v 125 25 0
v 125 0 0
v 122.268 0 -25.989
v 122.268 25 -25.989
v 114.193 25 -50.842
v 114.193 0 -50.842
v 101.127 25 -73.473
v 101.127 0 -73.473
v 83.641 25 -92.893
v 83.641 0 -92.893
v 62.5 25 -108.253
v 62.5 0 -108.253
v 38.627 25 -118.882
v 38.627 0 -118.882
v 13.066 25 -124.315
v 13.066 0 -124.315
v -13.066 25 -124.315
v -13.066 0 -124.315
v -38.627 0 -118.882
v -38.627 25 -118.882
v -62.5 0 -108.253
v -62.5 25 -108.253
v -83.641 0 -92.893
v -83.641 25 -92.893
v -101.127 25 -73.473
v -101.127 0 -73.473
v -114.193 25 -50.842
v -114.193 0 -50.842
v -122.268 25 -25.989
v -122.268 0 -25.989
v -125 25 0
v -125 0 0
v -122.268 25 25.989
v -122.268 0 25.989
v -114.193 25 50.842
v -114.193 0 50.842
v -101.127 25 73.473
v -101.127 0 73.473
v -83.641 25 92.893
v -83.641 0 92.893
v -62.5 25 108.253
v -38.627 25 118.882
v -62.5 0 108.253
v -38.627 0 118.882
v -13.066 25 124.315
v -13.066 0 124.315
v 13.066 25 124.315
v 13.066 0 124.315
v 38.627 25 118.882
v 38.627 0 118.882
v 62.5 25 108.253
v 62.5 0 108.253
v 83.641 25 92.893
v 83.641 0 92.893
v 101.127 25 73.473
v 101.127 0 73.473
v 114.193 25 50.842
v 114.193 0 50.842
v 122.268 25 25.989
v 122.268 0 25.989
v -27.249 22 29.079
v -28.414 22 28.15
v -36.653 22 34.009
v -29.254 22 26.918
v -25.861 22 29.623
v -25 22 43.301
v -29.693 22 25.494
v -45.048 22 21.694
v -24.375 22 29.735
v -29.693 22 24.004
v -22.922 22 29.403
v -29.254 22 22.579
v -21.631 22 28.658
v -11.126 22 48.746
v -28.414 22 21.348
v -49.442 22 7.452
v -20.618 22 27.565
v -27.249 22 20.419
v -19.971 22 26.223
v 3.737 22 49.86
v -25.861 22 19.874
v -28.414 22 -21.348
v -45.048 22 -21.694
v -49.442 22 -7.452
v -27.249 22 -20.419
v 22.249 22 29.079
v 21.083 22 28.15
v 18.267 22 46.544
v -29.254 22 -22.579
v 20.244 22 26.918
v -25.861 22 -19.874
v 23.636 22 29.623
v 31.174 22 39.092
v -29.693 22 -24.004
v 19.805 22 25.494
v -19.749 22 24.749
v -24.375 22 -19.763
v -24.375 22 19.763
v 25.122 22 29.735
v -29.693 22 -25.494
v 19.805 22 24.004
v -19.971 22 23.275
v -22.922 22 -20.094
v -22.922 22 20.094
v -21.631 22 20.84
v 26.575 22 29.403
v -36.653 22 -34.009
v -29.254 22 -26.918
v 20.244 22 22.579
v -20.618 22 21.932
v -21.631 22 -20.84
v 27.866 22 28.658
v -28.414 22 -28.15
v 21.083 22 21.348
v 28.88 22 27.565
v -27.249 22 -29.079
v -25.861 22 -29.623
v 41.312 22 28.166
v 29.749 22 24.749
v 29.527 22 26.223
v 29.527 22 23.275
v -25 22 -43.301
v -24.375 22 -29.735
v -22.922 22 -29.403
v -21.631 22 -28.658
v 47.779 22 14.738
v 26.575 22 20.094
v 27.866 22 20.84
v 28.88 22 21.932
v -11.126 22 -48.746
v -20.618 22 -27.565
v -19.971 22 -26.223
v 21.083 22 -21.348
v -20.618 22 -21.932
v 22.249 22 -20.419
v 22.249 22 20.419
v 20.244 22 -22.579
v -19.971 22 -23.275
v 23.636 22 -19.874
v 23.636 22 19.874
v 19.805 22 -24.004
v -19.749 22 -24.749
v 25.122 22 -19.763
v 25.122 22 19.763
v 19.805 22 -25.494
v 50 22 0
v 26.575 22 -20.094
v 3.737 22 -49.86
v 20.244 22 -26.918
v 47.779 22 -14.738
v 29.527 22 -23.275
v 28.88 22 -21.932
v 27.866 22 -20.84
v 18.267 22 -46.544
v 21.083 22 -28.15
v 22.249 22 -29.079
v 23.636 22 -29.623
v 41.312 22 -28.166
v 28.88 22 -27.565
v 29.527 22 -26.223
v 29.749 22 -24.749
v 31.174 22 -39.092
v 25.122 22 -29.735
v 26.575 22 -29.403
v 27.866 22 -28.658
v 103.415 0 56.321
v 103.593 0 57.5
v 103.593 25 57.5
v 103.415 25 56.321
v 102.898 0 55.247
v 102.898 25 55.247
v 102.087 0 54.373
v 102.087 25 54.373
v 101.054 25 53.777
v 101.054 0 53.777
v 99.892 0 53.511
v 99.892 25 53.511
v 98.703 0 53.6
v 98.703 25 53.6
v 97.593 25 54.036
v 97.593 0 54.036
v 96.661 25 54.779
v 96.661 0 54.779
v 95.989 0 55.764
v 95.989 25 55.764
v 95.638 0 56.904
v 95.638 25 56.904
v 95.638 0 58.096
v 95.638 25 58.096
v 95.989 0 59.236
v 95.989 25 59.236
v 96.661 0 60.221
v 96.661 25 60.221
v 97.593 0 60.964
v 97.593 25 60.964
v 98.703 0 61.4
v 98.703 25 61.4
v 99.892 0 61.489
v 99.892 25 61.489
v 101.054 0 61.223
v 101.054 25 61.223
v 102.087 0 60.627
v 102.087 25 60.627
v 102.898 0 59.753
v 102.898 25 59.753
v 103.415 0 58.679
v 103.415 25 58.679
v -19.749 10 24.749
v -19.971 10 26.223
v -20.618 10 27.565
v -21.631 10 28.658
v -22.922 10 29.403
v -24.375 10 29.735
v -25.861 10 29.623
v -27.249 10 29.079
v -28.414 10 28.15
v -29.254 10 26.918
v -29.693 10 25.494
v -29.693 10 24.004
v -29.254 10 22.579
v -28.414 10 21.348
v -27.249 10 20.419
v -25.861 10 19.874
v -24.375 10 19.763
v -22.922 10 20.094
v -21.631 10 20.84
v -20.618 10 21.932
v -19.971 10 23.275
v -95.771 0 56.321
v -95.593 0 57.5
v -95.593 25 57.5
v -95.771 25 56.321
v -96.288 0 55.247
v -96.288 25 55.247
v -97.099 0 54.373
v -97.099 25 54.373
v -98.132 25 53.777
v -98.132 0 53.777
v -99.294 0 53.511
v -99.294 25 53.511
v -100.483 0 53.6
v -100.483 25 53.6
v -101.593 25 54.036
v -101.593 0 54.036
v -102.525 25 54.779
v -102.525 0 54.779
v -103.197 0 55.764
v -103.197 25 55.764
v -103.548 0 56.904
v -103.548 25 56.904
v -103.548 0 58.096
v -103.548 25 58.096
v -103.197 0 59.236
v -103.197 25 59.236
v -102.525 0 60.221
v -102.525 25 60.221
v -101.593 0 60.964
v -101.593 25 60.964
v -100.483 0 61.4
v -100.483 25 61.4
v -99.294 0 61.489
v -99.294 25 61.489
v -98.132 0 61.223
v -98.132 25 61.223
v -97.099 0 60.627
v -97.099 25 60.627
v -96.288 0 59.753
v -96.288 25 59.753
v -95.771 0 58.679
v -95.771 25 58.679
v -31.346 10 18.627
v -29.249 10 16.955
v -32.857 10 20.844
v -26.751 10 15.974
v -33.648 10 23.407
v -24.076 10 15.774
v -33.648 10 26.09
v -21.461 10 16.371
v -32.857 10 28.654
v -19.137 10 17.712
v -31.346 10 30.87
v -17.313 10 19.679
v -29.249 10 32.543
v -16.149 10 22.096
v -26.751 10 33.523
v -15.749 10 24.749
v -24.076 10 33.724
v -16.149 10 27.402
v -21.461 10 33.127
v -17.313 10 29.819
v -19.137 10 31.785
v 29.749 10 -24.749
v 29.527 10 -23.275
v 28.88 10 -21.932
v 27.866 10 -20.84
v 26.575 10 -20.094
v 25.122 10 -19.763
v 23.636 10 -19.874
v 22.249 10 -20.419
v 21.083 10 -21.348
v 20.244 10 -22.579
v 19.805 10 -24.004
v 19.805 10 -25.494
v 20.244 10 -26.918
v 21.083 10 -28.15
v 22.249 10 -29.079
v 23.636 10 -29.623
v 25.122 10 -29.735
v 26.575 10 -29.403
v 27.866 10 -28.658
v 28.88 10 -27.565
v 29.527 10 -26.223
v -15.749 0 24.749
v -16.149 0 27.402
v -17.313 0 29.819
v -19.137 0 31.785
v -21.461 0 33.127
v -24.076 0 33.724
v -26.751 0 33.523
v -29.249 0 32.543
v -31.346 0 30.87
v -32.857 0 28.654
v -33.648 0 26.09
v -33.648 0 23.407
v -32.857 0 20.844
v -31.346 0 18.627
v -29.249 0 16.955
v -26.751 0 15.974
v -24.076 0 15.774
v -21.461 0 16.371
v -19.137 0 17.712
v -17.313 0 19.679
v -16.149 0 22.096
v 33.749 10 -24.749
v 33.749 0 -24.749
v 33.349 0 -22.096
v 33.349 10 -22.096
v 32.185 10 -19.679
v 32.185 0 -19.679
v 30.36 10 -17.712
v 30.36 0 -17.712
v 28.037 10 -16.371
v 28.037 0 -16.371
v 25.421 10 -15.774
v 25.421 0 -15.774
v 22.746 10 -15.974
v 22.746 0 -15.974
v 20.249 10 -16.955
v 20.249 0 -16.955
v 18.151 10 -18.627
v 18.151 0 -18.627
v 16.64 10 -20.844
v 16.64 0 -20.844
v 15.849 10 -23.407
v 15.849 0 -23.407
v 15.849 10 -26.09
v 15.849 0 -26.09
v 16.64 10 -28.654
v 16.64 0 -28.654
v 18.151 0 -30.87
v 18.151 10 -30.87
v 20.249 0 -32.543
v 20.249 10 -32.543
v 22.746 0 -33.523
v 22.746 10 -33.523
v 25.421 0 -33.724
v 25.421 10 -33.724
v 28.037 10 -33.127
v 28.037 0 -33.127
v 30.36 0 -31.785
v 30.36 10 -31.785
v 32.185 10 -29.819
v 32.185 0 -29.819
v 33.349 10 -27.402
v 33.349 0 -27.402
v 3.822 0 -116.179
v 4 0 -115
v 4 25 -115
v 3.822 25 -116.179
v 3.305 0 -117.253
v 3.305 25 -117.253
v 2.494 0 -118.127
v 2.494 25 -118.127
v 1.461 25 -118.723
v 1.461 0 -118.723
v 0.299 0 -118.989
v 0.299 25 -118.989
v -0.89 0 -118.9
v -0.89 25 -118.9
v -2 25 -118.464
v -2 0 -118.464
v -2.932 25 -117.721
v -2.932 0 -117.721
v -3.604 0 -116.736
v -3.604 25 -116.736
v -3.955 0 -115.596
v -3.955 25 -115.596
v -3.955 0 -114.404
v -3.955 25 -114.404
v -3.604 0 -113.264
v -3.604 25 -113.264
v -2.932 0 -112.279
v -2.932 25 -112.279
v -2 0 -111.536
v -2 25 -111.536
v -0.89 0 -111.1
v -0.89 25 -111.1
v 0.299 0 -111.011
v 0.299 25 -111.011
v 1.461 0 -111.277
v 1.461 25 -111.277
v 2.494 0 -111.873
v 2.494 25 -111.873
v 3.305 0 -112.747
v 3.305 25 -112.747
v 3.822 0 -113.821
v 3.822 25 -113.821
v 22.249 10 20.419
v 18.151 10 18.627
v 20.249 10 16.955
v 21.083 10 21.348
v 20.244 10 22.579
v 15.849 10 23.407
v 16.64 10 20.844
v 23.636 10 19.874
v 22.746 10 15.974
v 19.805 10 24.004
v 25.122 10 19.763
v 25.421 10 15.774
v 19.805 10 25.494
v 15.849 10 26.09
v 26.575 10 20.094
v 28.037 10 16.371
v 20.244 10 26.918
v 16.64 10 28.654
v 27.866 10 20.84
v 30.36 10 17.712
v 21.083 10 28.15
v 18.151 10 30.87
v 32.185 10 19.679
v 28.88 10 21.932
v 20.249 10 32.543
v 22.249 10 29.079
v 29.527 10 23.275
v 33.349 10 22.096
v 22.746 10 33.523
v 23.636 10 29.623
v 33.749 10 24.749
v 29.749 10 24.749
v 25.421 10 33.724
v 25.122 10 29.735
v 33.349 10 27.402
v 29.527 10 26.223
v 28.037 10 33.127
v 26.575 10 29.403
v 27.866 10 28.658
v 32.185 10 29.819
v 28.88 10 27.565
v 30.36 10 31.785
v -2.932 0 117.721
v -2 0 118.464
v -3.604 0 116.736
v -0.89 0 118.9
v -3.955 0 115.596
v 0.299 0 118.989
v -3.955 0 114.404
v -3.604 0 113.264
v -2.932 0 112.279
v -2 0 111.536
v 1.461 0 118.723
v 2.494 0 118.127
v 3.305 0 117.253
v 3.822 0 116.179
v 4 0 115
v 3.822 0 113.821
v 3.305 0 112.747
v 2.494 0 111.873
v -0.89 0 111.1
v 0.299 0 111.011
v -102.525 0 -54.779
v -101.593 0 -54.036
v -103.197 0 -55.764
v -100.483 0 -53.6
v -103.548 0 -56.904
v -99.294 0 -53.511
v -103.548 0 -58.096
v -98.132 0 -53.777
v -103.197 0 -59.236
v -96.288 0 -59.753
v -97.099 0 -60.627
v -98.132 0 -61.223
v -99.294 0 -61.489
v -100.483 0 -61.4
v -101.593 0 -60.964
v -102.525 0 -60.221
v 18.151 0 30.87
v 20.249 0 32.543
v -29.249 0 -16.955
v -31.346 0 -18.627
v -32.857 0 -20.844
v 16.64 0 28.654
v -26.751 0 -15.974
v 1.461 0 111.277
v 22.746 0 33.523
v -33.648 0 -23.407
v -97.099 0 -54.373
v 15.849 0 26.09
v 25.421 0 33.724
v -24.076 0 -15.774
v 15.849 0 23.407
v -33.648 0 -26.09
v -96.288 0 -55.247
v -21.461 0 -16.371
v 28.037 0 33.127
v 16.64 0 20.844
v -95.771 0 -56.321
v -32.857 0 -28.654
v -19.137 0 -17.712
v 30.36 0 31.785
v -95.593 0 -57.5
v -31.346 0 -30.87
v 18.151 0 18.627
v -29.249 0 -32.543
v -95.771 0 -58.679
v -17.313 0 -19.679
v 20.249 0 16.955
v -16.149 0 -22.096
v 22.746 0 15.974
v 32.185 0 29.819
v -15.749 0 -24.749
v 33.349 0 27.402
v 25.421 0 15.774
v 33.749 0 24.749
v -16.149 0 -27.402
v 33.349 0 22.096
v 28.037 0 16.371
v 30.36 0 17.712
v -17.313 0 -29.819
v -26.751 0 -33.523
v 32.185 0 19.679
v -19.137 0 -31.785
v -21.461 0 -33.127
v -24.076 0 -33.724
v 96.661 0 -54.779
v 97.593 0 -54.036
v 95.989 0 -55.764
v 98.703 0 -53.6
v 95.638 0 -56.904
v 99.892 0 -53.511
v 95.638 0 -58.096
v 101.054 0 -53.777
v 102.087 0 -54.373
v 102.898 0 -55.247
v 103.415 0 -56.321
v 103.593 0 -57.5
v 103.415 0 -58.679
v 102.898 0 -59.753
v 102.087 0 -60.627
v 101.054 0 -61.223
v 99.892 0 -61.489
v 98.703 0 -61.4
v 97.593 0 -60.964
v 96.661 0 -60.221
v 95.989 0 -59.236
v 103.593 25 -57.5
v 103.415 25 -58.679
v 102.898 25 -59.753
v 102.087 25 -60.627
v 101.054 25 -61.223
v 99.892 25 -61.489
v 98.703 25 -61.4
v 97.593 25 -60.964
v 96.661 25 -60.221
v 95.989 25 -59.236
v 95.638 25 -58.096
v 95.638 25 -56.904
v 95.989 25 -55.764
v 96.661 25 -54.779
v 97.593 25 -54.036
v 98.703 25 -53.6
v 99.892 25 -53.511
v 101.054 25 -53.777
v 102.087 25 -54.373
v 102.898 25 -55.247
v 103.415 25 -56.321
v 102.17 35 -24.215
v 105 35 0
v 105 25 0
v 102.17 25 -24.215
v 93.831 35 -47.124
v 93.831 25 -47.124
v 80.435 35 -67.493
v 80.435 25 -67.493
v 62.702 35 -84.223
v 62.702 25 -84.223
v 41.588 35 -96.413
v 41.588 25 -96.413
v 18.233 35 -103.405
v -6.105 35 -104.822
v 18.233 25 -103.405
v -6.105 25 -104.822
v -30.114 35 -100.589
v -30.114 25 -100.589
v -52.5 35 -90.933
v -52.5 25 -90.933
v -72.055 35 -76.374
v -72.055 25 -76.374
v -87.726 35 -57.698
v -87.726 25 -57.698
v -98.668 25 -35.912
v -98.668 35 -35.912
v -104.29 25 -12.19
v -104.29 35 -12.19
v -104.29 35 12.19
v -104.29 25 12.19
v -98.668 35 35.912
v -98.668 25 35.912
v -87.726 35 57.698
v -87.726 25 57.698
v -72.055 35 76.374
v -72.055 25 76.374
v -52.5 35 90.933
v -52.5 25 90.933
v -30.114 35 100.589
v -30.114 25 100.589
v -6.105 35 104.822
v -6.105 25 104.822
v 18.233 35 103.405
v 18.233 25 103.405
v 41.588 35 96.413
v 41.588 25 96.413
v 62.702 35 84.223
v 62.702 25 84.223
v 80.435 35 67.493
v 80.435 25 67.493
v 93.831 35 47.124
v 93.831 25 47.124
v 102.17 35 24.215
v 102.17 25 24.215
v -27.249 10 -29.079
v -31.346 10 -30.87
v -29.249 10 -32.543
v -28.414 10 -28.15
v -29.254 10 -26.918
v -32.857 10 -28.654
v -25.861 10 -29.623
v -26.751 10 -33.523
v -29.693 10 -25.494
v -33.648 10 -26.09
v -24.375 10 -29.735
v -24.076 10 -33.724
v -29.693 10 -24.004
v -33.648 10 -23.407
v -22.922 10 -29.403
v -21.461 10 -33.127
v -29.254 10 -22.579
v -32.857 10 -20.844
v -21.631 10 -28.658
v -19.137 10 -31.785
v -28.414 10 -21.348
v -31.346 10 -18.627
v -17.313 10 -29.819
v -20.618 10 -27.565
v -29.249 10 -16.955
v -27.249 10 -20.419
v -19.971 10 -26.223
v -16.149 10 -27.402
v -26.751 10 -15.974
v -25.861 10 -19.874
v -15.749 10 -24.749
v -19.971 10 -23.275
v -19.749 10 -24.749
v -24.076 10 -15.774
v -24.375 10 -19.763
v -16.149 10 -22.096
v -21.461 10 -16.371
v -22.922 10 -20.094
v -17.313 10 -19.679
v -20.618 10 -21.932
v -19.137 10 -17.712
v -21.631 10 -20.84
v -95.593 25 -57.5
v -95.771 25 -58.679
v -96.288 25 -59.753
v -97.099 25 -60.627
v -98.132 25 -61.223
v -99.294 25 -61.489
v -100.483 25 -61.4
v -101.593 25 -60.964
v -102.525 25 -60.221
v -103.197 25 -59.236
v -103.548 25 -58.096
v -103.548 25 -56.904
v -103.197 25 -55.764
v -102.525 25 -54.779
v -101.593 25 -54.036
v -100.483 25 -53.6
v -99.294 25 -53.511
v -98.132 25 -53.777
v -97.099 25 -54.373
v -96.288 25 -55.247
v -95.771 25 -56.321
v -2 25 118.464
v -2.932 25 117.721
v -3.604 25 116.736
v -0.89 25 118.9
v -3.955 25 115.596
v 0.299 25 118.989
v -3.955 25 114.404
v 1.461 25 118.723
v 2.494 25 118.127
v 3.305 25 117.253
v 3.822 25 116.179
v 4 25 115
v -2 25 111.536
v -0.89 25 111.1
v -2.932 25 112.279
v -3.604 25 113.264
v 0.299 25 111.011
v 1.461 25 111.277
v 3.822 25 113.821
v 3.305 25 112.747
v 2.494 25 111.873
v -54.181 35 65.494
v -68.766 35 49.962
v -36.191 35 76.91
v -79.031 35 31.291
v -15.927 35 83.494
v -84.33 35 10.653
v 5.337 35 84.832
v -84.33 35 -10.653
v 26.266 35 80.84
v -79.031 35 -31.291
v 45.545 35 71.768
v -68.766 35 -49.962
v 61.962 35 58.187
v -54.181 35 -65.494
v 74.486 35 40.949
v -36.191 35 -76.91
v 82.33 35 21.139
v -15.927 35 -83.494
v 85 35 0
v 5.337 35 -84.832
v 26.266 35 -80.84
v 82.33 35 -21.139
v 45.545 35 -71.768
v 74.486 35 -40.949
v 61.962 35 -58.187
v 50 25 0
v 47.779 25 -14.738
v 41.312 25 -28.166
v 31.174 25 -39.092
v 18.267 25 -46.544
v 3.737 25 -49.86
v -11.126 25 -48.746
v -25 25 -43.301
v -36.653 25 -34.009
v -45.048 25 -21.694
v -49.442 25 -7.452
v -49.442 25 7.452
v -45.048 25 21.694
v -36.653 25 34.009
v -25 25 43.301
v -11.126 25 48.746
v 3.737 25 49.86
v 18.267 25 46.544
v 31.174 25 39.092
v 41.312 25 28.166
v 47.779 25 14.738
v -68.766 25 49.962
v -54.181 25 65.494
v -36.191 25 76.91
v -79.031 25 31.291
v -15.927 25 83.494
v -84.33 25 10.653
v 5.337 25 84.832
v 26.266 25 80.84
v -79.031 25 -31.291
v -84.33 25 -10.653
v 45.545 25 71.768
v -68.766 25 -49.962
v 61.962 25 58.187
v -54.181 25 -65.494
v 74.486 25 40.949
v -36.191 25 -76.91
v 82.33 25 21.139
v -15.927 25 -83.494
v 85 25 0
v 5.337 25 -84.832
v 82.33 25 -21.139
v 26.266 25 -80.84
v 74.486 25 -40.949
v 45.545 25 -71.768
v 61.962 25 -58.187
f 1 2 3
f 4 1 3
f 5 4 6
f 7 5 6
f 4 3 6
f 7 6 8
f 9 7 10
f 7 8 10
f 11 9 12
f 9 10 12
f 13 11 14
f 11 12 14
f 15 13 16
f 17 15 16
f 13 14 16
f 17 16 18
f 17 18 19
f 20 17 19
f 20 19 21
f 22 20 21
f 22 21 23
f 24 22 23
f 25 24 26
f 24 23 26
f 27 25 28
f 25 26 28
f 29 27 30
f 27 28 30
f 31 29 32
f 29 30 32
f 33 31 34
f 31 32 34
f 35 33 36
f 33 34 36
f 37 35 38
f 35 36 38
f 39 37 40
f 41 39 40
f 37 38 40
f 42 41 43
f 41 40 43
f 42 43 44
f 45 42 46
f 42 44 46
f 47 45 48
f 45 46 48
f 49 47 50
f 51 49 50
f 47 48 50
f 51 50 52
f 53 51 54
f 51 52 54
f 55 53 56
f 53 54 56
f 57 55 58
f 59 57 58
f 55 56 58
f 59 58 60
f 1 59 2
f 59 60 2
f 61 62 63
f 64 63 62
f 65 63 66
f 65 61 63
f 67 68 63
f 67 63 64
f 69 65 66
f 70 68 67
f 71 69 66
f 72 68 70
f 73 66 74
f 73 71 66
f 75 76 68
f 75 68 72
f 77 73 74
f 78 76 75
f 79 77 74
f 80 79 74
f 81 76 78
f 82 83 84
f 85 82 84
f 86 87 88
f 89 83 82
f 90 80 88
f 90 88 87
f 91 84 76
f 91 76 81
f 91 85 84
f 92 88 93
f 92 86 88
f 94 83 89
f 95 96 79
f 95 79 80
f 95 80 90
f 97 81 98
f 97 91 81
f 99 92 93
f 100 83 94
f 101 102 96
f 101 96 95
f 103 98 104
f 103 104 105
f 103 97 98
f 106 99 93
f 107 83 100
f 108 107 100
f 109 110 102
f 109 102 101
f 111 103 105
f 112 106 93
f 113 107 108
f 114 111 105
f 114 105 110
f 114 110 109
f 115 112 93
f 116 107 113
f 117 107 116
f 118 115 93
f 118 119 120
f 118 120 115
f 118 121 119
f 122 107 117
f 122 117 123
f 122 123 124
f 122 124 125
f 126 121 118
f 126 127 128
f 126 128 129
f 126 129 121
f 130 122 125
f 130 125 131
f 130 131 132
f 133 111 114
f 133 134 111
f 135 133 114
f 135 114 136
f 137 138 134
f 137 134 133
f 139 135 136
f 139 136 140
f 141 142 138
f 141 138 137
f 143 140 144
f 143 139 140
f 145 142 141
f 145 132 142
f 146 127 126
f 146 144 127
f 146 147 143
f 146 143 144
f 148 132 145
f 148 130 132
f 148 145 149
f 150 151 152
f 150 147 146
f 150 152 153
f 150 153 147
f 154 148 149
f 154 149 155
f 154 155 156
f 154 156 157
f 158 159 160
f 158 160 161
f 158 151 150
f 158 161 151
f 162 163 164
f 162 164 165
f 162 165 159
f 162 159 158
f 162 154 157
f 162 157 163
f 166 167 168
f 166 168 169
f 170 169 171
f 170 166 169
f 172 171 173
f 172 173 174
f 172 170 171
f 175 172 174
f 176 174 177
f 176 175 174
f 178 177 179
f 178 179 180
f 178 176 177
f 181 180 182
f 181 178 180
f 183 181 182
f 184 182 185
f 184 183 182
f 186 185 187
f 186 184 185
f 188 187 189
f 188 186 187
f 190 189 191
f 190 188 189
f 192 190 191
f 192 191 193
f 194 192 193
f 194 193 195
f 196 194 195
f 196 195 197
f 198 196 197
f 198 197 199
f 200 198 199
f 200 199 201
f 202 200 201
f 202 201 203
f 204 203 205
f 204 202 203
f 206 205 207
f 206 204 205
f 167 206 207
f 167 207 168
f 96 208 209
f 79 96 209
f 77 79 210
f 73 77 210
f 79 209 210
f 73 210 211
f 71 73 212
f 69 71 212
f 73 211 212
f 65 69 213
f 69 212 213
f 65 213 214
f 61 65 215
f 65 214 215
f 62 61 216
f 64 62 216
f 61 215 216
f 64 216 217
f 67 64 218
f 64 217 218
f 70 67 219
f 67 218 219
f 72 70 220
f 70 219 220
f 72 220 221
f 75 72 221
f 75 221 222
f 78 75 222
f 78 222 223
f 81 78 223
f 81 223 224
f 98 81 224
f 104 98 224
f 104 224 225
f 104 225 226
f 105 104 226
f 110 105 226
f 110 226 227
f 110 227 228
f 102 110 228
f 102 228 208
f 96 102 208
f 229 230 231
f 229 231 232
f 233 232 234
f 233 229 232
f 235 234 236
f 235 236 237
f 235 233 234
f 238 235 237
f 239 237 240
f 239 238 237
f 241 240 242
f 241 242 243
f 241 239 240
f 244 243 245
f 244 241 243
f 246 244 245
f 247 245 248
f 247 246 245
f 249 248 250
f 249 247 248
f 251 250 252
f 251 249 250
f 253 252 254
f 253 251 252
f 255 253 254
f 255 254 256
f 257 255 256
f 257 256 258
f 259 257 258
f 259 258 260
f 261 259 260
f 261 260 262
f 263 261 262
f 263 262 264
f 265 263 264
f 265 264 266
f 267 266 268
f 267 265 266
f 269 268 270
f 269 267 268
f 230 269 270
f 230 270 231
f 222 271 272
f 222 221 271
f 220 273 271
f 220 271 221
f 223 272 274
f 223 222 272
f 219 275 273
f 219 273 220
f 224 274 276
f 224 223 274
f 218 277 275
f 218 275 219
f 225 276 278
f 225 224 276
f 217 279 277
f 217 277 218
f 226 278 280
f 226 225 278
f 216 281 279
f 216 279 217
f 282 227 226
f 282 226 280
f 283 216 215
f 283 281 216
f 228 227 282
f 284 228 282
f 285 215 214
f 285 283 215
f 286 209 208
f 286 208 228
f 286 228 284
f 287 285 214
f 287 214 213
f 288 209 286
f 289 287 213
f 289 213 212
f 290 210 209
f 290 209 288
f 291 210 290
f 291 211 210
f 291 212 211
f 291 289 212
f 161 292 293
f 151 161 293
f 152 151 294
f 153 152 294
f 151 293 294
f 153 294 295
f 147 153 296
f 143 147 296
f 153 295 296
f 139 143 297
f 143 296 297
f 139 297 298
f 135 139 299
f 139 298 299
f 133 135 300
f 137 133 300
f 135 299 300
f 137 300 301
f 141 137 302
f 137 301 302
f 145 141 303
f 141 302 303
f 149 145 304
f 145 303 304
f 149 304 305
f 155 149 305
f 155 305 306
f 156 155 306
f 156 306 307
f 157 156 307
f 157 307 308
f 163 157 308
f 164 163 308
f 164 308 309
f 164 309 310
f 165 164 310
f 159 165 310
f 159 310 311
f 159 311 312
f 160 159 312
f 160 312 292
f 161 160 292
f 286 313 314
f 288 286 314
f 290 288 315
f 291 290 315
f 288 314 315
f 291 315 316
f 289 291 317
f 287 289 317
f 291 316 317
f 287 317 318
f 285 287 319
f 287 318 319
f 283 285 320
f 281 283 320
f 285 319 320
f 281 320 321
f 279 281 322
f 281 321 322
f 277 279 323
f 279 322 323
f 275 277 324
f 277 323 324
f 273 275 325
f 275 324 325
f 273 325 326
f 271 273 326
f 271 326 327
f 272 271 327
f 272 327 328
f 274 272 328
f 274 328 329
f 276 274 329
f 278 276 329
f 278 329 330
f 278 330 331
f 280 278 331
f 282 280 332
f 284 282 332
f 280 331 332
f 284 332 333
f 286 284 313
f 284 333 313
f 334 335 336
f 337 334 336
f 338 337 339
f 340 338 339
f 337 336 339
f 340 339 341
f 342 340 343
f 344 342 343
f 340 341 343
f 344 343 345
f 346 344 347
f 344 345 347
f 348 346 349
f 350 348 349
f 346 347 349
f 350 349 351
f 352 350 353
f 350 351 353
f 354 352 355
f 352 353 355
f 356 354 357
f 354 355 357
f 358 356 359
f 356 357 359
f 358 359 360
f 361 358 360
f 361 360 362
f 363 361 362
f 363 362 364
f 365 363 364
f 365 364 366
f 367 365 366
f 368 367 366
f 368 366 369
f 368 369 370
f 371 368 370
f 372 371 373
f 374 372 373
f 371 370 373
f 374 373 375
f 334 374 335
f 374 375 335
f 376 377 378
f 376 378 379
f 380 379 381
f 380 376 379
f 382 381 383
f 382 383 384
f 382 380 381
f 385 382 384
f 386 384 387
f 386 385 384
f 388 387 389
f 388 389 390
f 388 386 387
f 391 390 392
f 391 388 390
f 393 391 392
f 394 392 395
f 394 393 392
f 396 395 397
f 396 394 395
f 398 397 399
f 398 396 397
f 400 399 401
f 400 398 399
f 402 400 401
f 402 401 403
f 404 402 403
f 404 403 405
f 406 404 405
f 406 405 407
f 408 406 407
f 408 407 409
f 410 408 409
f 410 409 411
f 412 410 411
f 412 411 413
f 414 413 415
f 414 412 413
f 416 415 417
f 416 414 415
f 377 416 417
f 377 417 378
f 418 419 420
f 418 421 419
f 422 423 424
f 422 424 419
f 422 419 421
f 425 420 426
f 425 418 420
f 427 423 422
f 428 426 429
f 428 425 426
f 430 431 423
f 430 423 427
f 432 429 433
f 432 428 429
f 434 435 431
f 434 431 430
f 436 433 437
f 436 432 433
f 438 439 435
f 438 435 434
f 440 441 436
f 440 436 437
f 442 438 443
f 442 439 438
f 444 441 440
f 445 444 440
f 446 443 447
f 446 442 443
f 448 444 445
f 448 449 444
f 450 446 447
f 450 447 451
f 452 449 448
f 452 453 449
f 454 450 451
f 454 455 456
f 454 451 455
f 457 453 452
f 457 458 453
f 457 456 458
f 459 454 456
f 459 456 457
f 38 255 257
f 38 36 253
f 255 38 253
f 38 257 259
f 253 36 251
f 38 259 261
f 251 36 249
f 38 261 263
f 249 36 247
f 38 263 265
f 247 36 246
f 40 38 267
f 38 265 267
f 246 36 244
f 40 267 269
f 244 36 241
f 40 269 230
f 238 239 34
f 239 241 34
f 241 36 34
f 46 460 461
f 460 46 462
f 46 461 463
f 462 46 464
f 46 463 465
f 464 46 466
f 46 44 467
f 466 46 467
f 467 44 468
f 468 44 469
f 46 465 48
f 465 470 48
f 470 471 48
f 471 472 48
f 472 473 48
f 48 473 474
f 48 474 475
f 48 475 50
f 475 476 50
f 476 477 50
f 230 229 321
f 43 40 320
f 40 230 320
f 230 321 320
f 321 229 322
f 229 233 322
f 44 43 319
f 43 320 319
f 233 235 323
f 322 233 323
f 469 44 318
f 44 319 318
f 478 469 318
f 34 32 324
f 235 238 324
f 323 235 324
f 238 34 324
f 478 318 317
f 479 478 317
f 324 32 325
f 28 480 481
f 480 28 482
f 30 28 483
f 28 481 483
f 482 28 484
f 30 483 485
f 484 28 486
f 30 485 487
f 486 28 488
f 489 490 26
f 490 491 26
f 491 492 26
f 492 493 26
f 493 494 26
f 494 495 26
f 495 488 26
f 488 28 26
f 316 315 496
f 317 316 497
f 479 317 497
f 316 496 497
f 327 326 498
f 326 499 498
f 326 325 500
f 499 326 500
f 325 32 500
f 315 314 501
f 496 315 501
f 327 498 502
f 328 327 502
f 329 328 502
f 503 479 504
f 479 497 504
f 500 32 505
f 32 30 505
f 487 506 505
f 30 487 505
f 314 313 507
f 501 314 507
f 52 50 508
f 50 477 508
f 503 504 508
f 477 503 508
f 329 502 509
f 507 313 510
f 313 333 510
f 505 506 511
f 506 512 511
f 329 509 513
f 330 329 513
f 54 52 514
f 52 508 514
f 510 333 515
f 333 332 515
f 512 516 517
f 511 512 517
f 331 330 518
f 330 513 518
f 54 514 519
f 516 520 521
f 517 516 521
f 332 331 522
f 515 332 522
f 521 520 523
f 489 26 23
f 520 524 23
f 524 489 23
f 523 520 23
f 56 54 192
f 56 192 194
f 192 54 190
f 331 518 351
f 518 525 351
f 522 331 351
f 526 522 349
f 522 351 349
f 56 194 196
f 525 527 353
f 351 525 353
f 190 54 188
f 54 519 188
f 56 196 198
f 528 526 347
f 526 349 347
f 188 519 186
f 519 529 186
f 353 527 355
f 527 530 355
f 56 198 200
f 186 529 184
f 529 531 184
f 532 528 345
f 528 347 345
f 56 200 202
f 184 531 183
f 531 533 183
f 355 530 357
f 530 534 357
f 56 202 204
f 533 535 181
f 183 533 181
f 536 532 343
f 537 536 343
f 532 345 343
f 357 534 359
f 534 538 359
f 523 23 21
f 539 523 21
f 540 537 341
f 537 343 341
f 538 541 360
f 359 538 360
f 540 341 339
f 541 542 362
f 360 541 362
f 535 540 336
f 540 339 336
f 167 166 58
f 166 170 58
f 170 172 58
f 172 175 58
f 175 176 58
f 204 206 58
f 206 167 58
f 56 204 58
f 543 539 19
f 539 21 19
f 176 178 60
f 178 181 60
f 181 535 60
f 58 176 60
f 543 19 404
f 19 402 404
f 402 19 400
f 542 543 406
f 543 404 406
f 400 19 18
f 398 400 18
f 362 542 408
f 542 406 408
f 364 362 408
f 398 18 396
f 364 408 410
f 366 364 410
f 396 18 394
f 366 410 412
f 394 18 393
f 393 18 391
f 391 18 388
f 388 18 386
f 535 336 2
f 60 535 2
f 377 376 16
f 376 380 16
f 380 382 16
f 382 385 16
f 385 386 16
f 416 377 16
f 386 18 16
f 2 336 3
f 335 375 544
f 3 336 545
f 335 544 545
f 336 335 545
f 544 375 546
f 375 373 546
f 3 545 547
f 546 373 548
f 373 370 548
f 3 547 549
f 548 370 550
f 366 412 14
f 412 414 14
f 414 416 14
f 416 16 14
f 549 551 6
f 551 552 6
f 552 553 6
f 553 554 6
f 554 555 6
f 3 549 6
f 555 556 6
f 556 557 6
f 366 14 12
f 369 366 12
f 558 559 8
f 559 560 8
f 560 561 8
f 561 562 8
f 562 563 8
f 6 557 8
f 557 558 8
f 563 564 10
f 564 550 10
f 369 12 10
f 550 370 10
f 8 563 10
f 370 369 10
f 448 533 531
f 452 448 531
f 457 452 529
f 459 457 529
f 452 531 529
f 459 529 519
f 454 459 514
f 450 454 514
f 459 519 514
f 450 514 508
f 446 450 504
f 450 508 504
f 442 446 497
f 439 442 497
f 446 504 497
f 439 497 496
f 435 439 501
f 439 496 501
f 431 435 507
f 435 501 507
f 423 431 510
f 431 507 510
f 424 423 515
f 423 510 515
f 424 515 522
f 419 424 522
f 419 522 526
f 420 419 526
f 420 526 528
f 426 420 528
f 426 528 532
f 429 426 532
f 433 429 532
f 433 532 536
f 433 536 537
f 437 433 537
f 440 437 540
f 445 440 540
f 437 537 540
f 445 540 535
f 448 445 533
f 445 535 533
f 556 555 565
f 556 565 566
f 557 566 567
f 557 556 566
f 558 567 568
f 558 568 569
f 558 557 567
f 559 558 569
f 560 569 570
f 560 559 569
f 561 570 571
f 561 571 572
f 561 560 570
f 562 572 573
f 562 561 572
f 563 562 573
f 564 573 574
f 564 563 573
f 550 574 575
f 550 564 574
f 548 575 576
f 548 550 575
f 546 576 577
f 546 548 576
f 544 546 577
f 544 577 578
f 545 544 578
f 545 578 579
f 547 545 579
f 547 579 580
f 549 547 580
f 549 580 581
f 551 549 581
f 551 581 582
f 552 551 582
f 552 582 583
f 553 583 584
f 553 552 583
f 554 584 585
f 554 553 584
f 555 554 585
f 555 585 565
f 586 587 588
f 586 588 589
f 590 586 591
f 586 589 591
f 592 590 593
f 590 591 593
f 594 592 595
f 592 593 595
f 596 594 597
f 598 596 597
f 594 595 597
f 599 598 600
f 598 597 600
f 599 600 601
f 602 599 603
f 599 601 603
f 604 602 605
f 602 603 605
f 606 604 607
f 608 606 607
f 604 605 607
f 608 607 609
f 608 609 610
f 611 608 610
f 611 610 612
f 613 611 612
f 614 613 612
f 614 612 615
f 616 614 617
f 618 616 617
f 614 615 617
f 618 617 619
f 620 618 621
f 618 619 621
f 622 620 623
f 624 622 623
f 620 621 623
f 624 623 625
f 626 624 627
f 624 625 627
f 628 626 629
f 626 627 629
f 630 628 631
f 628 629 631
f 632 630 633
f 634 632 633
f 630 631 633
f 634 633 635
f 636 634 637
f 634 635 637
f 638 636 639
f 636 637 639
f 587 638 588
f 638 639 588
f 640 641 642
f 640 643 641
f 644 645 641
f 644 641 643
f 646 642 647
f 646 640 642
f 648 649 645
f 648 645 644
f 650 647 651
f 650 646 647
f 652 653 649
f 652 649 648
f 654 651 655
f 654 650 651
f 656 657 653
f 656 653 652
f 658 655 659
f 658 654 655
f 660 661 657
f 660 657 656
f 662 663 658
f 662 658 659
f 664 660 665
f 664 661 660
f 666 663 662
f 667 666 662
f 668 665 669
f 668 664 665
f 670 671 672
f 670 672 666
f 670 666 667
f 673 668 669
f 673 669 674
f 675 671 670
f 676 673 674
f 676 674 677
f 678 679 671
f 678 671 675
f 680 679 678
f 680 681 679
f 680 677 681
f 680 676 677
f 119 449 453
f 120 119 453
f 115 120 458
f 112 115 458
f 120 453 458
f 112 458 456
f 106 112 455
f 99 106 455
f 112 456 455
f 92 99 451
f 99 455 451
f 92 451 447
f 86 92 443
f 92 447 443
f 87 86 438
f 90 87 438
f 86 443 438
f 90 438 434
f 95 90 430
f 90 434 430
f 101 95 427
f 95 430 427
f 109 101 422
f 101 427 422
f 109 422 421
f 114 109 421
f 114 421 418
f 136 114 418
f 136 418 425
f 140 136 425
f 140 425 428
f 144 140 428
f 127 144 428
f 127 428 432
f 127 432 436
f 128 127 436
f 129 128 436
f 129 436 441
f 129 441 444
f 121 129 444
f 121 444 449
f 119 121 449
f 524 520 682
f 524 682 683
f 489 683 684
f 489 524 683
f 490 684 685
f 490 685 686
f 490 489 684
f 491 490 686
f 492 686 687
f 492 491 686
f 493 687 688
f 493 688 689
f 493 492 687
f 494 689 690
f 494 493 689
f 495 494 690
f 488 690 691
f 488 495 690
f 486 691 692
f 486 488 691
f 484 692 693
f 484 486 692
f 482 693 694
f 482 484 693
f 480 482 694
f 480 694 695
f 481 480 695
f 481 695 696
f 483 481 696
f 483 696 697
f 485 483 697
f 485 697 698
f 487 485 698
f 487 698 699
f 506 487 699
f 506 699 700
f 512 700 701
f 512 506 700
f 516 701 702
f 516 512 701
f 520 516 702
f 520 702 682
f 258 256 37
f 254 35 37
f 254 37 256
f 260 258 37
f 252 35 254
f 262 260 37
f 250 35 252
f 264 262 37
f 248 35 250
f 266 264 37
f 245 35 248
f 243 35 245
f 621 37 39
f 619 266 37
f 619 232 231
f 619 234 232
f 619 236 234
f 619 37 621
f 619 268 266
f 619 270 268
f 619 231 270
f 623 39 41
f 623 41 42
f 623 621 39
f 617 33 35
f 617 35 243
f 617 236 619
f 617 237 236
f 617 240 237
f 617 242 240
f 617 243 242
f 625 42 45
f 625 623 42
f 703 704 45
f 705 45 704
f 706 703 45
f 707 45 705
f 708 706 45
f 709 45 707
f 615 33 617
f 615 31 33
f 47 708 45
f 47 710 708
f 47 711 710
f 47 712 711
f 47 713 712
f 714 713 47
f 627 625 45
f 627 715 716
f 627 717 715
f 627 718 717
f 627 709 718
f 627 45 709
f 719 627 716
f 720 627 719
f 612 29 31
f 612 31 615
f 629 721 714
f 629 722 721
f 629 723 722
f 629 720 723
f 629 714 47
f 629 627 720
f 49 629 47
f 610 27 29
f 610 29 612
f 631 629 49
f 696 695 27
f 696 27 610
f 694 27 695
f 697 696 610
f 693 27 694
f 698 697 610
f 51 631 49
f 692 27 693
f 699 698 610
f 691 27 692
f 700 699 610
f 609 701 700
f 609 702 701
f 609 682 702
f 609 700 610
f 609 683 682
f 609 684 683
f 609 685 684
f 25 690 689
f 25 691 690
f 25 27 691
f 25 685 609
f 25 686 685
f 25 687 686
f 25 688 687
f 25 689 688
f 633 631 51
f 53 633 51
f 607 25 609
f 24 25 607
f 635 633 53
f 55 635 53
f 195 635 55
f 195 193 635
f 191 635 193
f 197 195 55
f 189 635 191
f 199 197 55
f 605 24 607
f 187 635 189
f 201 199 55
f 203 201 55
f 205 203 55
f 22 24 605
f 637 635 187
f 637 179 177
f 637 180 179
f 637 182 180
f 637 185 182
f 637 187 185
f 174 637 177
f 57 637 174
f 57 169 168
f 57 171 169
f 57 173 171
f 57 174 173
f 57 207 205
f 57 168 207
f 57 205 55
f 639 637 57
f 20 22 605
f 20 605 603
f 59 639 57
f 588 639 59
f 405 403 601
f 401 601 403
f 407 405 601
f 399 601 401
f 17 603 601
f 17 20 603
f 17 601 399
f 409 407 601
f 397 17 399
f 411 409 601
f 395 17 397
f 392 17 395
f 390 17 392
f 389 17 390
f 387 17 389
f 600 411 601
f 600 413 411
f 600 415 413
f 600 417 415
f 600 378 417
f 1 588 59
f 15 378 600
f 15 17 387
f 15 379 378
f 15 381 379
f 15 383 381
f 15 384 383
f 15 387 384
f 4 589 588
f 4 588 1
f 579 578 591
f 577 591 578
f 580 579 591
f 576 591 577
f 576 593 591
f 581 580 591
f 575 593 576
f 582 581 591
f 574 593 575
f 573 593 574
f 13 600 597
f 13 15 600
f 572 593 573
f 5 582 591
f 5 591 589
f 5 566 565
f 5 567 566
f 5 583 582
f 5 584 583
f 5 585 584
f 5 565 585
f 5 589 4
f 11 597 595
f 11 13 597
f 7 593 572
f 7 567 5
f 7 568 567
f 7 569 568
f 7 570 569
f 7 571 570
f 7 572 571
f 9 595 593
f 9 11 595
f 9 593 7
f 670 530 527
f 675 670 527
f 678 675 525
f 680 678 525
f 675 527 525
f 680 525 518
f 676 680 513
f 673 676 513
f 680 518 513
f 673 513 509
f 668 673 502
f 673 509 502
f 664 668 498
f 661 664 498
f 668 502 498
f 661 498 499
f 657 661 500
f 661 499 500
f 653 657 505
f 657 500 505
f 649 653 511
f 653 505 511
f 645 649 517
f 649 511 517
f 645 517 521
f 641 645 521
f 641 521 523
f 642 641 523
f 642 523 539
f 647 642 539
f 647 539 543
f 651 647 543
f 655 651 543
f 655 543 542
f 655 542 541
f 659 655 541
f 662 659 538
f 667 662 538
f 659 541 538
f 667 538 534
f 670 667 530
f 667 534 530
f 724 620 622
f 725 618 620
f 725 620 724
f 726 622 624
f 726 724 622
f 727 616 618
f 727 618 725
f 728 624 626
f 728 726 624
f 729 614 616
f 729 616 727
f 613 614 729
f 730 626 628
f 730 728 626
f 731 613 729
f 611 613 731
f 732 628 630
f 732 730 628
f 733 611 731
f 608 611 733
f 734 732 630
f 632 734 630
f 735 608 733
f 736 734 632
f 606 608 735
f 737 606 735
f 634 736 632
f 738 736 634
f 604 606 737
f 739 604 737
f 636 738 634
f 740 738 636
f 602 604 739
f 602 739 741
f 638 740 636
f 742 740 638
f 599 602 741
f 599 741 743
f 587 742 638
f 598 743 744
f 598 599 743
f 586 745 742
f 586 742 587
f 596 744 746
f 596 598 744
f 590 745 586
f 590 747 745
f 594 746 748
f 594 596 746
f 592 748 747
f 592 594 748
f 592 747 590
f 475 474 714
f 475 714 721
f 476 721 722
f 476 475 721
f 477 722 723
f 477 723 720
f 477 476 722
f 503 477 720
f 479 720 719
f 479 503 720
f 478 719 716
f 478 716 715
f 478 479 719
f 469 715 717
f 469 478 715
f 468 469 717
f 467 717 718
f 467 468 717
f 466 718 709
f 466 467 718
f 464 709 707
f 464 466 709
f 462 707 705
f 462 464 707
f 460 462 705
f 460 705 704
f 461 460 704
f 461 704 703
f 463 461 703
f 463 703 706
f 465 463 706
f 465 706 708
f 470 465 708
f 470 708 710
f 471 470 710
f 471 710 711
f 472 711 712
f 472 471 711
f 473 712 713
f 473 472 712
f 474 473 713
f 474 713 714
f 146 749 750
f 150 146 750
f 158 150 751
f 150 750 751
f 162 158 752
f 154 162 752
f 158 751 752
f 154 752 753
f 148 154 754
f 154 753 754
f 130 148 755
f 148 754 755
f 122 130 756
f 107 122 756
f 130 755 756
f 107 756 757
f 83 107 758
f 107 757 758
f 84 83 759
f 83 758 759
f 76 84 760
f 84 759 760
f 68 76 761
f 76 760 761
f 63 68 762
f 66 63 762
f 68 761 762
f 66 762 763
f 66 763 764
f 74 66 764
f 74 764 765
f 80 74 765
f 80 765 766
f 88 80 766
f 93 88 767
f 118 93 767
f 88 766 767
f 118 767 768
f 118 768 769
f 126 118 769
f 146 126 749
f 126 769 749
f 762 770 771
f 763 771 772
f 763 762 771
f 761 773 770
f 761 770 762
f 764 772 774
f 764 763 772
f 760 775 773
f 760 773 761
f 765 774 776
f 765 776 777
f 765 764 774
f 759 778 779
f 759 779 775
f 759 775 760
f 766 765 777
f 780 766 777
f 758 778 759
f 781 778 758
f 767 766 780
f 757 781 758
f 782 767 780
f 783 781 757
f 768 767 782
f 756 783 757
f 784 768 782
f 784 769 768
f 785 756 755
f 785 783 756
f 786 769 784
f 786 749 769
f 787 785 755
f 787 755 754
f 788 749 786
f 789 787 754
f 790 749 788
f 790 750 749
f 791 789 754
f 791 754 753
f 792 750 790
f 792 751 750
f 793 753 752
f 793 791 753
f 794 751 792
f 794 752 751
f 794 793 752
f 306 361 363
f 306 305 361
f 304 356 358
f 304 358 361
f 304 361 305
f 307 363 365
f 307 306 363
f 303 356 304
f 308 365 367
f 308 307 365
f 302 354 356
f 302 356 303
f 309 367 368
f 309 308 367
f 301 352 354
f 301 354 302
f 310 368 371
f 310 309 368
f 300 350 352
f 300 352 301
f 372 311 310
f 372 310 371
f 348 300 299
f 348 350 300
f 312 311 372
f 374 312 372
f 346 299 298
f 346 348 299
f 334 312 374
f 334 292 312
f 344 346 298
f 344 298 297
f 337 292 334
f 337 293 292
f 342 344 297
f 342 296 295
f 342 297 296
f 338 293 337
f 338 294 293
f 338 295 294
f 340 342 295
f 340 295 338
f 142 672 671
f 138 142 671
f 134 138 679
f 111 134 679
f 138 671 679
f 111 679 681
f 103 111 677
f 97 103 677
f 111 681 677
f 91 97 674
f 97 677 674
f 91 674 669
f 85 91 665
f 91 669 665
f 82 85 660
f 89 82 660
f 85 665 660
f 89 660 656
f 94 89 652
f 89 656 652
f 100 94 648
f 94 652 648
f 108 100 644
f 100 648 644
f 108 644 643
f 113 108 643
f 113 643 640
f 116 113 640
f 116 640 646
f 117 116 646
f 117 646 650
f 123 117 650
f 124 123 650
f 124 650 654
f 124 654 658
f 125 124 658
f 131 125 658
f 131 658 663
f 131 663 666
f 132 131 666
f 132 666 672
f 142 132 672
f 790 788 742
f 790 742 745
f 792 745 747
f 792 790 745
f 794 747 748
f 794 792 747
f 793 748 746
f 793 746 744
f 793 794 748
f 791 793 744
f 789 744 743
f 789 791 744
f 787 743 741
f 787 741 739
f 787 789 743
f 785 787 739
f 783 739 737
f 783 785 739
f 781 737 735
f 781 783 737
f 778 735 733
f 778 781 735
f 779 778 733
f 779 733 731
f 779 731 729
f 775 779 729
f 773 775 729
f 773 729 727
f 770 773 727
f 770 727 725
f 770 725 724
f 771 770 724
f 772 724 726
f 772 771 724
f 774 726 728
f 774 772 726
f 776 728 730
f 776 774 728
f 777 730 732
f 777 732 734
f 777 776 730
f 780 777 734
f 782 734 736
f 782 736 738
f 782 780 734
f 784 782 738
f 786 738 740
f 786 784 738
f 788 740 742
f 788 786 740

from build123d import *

# Parameters (mm, degrees)
SKETCH1_R           = 125
SKETCH1_R_2         = 4
BOSS_EXTRUDE1_DEPTH = 25
SKETCH4_R           = 9
CUT_EXTRUDE1_DEPTH  = 10
SKETCH6_R           = 5
CUT_EXTRUDE2_DEPTH  = 15
SKETCH7_R           = 50
CUT_EXTRUDE3_DEPTH  = 3
SKETCH8_R           = 105
SKETCH8_R_2         = 85
BOSS_EXTRUDE2_DEPTH = 10


with BuildPart() as part:
    # Sketch1 → Boss-Extrude1 (new body)
    with BuildSketch(Plane(origin=(0, 0, 0), x_dir=(1, 0, 0), z_dir=(0, 1, 0))):
        Circle(SKETCH1_R)
        with Locations((0, 115)):
            Circle(SKETCH1_R_2, mode=Mode.SUBTRACT)
        with Locations((99.592921435, 57.5)):
            Circle(SKETCH1_R_2, mode=Mode.SUBTRACT)
        with Locations((99.592921435, -57.5)):
            Circle(SKETCH1_R_2, mode=Mode.SUBTRACT)
        with Locations((0, -115)):
            Circle(SKETCH1_R_2, mode=Mode.SUBTRACT)
        with Locations((-99.592921435, -57.5)):
            Circle(SKETCH1_R_2, mode=Mode.SUBTRACT)
        with Locations((-99.592921435, 57.5)):
            Circle(SKETCH1_R_2, mode=Mode.SUBTRACT)
    extrude(amount=BOSS_EXTRUDE1_DEPTH)

    # Sketch4 → Cut-Extrude1 (cut)
    with BuildSketch(Plane.XZ):
        with Locations((-24.748737342, 24.748737342)):
            Circle(SKETCH4_R)
        with Locations((24.748737342, 24.748737342)):
            Circle(SKETCH4_R)
        with Locations((24.748737342, -24.748737342)):
            Circle(SKETCH4_R)
        with Locations((-24.748737342, -24.748737342)):
            Circle(SKETCH4_R)
    extrude(amount=-CUT_EXTRUDE1_DEPTH, mode=Mode.SUBTRACT)

    # Sketch6 → Cut-Extrude2 (cut)
    with BuildSketch(Plane.XZ.offset(-10)):
        with Locations((-24.748737342, 24.748737342)):
            Circle(SKETCH6_R)
        with Locations((24.748737342, 24.748737342)):
            Circle(SKETCH6_R)
        with Locations((24.748737342, -24.748737342)):
            Circle(SKETCH6_R)
        with Locations((-24.748737342, -24.748737342)):
            Circle(SKETCH6_R)
    extrude(amount=-CUT_EXTRUDE2_DEPTH, mode=Mode.SUBTRACT)

    # Sketch7 → Cut-Extrude3 (cut)
    with BuildSketch(Plane(origin=(0, 25, 0), x_dir=(1, 0, 0), z_dir=(0, 1, 0))):
        Circle(SKETCH7_R)
    extrude(amount=-CUT_EXTRUDE3_DEPTH, mode=Mode.SUBTRACT)

    # Sketch8 → Boss-Extrude2 (add)
    with BuildSketch(Plane(origin=(0, 25, 0), x_dir=(1, 0, 0), z_dir=(0, 1, 0))):
        Circle(SKETCH8_R)
        Circle(SKETCH8_R_2, mode=Mode.SUBTRACT)
    extrude(amount=BOSS_EXTRUDE2_DEPTH)


solid = part.part
